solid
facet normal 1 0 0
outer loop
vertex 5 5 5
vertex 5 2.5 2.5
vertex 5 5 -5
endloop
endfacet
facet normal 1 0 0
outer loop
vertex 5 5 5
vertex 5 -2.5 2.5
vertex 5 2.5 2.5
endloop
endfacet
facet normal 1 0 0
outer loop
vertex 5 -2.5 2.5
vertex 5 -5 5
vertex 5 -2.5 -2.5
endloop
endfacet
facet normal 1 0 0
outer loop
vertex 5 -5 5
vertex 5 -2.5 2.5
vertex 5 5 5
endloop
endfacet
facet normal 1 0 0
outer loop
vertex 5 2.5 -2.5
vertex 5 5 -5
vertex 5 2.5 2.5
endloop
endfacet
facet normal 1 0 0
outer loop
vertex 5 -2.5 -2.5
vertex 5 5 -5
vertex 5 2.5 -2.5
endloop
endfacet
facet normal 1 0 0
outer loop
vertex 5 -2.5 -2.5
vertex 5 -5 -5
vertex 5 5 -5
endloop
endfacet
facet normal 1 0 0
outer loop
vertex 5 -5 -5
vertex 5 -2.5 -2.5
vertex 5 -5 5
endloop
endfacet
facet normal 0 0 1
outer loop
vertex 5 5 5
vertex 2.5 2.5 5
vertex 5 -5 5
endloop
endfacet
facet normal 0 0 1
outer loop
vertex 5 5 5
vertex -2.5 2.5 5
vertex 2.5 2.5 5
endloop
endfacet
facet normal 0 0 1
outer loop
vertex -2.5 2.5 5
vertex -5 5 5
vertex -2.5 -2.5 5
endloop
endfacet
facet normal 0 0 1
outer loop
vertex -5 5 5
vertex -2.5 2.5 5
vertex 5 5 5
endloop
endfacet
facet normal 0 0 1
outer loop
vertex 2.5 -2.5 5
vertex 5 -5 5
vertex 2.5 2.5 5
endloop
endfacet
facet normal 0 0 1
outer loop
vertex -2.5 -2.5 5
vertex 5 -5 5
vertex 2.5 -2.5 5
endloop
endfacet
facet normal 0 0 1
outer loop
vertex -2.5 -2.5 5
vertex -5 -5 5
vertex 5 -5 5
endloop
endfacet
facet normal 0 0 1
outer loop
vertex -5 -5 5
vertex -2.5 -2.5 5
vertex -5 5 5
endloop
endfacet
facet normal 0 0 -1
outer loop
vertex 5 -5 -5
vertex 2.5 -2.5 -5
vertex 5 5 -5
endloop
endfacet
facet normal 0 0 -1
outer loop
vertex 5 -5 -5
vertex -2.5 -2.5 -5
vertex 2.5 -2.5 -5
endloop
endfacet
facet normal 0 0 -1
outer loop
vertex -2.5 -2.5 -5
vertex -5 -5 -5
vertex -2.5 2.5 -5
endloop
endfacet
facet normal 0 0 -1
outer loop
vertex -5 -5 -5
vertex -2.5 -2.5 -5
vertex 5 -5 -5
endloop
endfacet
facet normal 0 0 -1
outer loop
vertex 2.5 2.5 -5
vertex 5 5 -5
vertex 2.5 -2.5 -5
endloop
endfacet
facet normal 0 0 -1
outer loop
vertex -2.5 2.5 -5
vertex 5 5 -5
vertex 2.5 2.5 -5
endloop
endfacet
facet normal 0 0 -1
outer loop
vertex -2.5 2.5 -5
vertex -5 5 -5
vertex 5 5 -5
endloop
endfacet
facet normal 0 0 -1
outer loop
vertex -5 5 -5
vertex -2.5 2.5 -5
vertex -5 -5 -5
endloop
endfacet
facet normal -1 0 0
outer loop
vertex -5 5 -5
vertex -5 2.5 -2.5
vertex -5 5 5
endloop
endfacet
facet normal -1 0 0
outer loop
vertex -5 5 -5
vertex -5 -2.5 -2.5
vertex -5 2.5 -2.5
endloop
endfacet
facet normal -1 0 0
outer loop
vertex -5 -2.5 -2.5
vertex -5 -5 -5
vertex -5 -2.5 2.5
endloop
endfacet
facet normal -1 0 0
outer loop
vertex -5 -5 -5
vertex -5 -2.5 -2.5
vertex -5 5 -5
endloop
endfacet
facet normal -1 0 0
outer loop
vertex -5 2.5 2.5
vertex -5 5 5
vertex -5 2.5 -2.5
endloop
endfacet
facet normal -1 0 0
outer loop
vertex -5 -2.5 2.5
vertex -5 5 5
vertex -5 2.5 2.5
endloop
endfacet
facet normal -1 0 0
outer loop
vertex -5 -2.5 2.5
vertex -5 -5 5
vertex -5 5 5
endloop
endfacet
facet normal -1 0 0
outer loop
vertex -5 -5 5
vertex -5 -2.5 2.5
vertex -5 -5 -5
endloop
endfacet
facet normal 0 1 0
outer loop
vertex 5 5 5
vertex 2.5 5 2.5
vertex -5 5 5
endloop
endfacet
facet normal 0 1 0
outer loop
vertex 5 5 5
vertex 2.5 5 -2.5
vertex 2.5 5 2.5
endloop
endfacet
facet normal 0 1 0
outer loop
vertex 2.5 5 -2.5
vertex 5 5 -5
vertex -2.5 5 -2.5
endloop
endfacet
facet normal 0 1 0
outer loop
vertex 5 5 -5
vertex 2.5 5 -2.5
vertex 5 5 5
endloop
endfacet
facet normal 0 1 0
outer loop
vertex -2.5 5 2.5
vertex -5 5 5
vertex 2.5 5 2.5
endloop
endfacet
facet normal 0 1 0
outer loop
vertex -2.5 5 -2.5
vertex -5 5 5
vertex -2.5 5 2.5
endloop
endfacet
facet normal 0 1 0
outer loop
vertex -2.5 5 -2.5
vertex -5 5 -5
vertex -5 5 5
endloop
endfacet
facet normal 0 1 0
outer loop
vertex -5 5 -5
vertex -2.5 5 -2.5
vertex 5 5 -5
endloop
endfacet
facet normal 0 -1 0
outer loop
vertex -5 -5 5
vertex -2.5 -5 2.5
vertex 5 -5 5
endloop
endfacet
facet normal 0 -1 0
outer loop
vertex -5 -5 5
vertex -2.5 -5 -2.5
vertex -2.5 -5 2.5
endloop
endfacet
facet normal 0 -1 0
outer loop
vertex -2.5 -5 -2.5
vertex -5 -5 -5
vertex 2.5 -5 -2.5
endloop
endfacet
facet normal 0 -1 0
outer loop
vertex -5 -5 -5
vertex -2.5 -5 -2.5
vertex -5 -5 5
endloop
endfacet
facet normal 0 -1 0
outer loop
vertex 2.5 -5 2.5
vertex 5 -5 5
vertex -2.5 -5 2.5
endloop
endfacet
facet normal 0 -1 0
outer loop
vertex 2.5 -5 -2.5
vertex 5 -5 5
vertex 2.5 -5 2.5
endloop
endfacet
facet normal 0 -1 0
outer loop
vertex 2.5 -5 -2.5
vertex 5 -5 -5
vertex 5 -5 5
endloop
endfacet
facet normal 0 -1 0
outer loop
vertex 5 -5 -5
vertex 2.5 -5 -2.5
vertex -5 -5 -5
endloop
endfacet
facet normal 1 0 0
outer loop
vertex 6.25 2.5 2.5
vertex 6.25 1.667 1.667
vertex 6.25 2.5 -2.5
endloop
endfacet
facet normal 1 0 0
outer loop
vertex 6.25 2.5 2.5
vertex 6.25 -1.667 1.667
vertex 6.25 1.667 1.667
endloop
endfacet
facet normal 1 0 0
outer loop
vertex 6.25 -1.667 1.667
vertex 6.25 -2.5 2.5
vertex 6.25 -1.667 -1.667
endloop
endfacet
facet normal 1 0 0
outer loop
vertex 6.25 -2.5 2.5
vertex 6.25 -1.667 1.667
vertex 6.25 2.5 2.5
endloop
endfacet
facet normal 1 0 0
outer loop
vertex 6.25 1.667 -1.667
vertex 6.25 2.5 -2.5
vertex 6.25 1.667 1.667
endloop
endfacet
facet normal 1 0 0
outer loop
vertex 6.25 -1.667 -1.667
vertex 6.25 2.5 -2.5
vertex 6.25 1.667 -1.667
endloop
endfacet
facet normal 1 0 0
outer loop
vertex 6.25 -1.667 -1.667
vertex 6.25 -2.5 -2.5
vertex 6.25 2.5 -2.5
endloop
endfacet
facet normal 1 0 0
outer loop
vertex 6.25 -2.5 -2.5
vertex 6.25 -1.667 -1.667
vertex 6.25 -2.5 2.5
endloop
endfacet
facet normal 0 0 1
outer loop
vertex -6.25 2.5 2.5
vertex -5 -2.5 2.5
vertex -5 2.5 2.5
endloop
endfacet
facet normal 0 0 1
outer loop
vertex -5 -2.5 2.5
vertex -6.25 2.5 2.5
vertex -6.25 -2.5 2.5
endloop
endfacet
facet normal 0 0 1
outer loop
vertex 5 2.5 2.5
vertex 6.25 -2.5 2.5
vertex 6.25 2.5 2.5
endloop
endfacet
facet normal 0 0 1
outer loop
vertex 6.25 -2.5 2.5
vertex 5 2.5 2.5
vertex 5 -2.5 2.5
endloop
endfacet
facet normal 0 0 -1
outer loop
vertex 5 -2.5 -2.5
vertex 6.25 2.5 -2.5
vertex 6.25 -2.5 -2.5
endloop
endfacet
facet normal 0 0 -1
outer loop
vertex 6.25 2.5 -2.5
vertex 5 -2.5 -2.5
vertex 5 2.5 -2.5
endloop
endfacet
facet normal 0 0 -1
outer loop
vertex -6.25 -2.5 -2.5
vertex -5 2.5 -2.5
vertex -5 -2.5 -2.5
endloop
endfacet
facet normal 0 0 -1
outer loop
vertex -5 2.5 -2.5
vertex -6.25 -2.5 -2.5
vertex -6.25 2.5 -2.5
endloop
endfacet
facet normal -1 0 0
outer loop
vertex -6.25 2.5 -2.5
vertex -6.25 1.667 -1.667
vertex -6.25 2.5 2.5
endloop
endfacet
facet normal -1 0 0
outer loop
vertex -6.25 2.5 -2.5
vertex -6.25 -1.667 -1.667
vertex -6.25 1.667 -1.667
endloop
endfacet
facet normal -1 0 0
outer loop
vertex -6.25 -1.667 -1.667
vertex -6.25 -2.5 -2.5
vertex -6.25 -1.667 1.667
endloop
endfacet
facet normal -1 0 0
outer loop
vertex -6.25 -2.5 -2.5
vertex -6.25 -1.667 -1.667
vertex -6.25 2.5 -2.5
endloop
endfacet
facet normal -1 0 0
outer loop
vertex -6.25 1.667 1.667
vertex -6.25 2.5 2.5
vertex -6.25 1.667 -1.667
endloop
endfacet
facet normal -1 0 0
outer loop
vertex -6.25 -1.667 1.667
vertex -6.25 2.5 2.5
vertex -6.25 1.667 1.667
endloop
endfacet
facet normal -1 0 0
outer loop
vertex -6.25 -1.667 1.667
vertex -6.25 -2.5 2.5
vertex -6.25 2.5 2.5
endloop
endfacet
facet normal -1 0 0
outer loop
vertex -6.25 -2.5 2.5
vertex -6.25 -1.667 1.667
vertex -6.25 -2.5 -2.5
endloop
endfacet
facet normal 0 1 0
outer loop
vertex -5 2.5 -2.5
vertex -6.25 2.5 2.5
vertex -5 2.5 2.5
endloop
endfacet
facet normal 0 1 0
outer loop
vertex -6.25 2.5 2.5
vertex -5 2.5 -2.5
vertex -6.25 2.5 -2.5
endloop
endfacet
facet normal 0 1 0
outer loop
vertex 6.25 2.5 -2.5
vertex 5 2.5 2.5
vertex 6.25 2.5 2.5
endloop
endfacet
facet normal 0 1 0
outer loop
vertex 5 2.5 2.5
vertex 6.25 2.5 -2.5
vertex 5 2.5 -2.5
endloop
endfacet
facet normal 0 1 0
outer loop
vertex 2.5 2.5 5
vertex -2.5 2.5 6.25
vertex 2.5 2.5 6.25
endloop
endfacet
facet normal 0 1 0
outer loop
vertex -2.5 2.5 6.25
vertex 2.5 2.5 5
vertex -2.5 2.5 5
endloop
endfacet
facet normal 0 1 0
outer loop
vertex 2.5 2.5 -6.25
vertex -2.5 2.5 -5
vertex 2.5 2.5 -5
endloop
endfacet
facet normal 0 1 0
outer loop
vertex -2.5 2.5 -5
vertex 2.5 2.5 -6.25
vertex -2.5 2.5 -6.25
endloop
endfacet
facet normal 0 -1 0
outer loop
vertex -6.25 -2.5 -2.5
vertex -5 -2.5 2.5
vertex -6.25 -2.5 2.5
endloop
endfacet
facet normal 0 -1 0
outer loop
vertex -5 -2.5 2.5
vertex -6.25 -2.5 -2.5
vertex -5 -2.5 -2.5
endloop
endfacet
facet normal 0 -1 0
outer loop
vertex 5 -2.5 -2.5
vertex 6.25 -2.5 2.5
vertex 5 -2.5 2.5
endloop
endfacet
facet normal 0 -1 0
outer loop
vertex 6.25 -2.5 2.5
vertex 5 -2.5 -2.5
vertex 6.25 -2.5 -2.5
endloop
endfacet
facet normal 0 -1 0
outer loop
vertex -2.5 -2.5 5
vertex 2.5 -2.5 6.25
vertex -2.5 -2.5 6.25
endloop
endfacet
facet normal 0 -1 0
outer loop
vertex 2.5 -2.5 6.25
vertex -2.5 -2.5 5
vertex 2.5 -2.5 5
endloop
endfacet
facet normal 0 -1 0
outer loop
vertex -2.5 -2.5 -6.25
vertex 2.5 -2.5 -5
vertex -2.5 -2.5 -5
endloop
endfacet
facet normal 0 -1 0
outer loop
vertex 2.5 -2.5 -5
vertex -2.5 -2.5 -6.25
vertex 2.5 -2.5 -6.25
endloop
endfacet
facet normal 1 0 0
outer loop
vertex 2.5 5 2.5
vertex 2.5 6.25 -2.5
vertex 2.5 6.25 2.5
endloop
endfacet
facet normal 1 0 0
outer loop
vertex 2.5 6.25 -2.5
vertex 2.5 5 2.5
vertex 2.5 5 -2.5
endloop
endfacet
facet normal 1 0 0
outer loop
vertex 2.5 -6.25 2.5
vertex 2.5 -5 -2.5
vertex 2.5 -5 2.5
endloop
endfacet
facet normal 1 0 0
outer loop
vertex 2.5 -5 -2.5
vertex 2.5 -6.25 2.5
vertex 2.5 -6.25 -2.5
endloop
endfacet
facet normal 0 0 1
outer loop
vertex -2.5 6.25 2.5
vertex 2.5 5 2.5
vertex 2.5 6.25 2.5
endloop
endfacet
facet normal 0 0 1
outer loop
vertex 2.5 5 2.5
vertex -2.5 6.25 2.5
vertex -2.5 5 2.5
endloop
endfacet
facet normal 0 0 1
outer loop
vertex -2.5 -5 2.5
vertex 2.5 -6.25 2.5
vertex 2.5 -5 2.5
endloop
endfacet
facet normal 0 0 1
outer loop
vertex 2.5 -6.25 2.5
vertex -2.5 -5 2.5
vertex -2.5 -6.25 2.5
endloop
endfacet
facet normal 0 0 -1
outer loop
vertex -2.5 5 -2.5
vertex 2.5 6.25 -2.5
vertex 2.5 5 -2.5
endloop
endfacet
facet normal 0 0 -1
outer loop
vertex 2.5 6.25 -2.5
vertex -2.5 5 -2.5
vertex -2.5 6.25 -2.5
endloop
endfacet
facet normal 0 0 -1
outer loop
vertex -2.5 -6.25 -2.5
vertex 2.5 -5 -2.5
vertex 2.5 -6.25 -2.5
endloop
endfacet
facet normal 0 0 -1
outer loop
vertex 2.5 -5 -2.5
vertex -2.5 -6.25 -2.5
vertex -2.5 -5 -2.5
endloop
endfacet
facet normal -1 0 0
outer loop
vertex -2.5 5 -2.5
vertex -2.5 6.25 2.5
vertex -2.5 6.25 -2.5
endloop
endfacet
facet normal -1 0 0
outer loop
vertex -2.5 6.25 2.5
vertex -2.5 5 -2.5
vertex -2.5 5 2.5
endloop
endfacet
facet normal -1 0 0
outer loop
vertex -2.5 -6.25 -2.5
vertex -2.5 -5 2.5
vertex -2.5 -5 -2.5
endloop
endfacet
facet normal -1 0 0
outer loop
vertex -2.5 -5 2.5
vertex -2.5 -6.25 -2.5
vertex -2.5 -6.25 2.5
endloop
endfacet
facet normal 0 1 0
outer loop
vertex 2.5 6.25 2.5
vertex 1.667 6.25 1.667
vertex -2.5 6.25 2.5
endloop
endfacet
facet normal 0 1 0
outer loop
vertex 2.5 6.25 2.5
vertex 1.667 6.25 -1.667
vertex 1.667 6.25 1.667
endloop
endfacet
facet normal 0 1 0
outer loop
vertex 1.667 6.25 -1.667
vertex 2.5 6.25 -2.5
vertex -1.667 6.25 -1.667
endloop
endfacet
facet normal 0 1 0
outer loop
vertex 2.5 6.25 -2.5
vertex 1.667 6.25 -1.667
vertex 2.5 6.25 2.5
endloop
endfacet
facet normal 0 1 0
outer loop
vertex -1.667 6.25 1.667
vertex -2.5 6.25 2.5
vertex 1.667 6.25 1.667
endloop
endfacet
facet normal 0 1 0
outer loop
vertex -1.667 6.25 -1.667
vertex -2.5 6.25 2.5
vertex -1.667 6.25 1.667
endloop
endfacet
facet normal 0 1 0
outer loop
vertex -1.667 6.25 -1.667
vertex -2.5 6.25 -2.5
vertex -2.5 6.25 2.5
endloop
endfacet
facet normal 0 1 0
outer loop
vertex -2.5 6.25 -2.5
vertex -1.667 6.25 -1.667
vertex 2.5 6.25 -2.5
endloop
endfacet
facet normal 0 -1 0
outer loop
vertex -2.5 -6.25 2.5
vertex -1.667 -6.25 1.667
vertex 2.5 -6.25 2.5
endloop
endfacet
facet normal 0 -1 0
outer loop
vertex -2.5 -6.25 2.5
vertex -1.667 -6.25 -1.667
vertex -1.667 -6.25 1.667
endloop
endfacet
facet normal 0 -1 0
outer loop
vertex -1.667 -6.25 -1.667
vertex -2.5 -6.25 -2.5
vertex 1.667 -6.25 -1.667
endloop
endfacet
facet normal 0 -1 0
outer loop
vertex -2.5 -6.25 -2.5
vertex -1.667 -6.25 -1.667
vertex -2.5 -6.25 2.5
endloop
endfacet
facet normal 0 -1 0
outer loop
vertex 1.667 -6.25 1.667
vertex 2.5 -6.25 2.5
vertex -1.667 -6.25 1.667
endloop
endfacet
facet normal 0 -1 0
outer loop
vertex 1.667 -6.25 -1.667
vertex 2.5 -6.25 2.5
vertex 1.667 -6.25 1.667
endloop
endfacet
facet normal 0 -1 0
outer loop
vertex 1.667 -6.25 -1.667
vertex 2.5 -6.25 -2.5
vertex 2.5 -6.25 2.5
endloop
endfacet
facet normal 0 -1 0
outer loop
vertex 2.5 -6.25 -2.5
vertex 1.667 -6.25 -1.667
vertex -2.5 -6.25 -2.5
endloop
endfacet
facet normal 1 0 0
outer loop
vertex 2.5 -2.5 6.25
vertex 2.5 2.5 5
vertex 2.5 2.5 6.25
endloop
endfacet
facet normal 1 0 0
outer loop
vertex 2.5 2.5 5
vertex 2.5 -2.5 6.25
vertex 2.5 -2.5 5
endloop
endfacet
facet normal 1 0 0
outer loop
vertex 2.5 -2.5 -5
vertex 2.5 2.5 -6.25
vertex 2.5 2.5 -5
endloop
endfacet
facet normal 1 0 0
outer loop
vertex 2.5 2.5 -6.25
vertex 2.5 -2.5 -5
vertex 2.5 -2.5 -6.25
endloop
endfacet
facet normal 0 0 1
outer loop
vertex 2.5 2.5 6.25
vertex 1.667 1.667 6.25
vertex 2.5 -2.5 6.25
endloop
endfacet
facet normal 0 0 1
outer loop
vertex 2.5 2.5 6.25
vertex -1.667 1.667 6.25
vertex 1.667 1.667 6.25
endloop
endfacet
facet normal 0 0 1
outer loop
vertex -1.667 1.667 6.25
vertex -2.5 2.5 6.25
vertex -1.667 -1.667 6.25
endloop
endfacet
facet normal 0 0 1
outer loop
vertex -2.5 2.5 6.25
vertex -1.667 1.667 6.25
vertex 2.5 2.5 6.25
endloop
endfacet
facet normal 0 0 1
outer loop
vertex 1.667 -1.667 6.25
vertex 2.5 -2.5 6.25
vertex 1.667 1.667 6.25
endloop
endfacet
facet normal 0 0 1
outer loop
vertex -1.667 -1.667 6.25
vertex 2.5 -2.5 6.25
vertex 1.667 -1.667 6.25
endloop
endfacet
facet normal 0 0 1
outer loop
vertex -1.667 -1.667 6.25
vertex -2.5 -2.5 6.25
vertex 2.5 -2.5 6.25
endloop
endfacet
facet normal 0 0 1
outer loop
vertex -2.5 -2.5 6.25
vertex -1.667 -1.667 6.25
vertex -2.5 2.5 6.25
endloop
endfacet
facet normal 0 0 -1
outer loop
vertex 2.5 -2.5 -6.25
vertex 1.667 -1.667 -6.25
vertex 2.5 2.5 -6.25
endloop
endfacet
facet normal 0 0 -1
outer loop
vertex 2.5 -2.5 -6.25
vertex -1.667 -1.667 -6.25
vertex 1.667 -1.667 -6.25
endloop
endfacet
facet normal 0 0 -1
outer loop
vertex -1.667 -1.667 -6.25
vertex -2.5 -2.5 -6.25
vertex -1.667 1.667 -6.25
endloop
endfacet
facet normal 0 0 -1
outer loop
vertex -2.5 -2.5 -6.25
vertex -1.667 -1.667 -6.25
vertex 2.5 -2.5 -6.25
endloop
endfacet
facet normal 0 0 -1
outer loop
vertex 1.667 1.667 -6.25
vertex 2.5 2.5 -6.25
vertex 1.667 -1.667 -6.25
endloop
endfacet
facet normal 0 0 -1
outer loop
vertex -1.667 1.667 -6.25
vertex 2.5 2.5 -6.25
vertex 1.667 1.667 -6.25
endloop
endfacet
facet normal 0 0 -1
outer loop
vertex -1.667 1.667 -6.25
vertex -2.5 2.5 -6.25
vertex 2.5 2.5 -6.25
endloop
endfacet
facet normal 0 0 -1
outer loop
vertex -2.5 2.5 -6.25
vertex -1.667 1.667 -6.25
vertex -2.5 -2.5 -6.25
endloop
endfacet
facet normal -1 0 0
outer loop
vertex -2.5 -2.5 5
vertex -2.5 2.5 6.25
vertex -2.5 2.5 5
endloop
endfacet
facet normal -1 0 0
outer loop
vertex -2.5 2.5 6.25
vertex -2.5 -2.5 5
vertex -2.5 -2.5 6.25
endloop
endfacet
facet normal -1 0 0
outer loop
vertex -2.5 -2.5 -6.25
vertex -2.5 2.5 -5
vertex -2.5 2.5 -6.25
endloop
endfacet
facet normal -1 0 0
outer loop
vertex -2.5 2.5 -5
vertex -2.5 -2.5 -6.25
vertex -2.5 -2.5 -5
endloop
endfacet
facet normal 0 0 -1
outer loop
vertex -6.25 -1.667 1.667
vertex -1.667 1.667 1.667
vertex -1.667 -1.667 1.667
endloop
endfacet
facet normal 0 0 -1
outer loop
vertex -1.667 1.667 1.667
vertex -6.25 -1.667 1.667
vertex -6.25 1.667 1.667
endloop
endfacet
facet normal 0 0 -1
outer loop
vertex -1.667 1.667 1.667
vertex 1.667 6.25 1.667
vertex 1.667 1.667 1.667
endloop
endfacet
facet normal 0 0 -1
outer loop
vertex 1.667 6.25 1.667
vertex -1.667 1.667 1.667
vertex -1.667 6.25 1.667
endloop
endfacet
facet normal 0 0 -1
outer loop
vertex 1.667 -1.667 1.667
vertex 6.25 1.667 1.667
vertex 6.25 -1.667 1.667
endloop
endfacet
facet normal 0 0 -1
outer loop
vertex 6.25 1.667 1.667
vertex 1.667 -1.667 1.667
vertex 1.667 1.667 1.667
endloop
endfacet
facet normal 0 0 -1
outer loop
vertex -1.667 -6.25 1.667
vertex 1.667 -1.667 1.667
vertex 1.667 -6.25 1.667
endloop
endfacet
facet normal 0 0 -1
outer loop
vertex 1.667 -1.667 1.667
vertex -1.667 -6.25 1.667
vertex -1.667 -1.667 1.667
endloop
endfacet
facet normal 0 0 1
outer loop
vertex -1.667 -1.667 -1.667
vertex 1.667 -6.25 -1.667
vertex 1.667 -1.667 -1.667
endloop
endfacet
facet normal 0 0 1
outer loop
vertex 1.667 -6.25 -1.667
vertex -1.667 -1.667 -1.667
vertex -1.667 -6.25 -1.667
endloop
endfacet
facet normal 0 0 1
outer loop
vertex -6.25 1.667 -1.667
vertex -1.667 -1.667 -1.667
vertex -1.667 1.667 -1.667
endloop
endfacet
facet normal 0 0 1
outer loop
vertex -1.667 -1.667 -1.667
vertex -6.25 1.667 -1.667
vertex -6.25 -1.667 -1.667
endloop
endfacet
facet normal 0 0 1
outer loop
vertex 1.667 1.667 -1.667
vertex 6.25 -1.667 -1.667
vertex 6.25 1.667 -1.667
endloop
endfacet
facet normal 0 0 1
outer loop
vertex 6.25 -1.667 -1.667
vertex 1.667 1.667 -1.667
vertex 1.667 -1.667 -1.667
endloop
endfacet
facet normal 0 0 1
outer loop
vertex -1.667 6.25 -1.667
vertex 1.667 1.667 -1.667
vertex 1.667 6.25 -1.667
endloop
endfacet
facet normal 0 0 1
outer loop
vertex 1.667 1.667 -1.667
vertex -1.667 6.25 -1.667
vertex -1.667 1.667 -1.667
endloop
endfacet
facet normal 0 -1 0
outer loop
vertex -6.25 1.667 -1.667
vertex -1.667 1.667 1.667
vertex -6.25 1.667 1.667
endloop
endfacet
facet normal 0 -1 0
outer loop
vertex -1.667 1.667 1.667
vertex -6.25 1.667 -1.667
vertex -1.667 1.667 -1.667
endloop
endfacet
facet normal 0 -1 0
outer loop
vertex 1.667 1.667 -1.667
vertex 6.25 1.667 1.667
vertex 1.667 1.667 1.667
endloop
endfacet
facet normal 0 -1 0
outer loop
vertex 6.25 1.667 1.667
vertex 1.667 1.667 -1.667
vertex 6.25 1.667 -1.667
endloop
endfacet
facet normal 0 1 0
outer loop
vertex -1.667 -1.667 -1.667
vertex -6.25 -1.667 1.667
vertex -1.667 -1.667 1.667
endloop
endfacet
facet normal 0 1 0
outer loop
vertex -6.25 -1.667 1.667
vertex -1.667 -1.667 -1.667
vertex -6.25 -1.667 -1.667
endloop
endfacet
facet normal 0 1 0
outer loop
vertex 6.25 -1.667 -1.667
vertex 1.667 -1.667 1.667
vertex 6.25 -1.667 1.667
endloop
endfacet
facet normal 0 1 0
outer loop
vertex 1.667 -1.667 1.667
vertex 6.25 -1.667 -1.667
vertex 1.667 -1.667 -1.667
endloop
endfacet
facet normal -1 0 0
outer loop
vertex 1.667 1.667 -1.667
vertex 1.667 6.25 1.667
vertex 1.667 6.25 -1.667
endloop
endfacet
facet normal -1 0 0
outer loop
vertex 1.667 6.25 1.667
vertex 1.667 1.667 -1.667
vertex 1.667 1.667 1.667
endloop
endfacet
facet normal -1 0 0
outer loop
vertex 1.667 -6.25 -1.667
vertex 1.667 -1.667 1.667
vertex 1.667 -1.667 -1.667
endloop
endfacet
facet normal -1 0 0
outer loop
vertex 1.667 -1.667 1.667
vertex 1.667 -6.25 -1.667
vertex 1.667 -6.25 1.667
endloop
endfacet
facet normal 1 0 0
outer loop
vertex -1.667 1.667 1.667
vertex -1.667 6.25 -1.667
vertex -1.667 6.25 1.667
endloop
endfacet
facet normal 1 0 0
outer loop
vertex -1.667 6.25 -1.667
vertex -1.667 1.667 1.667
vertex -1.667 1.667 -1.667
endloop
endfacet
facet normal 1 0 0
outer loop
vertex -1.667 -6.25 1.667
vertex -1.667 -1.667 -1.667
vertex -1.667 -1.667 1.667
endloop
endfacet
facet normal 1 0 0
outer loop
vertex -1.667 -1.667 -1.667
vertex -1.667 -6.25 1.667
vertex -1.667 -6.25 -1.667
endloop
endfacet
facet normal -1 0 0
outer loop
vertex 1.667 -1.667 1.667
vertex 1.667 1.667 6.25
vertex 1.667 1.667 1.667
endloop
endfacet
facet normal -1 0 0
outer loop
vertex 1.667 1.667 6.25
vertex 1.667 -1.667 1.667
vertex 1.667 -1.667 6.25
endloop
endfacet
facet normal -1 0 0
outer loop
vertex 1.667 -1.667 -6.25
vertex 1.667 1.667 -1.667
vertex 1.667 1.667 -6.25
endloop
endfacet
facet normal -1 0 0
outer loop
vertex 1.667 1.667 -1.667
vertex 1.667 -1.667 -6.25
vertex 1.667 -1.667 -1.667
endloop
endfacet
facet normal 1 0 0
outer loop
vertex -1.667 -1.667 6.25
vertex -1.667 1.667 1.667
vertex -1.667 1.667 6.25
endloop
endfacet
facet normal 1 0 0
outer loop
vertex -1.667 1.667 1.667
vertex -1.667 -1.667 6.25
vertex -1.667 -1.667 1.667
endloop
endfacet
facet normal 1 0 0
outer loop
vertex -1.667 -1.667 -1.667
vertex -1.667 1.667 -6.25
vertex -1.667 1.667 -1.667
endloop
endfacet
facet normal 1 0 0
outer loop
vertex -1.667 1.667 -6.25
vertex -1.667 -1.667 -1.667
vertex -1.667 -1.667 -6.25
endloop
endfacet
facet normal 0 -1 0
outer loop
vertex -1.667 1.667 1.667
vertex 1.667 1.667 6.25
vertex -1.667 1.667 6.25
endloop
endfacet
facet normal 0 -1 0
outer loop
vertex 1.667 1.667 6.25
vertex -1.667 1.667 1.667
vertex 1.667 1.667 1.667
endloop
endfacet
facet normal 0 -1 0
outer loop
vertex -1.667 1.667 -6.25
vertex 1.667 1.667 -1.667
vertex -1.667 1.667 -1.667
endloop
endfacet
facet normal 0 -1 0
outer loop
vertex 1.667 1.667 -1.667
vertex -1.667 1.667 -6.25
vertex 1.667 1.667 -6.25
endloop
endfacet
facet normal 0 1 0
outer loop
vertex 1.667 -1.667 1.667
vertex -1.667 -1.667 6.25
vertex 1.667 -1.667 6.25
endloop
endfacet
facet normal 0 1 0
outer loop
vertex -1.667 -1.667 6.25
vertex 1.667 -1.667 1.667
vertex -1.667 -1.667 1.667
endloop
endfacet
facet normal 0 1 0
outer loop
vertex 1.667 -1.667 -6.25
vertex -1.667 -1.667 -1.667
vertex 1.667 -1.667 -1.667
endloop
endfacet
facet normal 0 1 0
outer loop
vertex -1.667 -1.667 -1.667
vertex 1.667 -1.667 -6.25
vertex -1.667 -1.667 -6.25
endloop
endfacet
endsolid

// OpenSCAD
//!Openscad
//Simple Customizer SCAD Script
//Size of main cube:
mainCube = 10; // [10:200]
//Color of main cube:
mainCubeColor = "Blue"; //

    difference() {
		union() {
			color(mainCubeColor,1) cube([mainCube, mainCube, mainCube], center = true);
			color("Red",1) cube([mainCube*1.25, mainCube/2, mainCube/2], center = true);
			color("Green",1) cube([mainCube/2, mainCube*1.25, mainCube/2], center = true);
			color("Purple",1) cube([mainCube/2, mainCube/2, mainCube*1.25], center = true);
  
		}
		union() {
			color("Orange",1) cube([mainCube*1.5, mainCube/3, mainCube/3], center = true);
			color("Cyan",1) cube([mainCube/3, mainCube*1.5, mainCube/3], center = true);
			color("DeepPink",1)cube([mainCube/3, mainCube/3, mainCube*1.5], center = true);
		}
	}
